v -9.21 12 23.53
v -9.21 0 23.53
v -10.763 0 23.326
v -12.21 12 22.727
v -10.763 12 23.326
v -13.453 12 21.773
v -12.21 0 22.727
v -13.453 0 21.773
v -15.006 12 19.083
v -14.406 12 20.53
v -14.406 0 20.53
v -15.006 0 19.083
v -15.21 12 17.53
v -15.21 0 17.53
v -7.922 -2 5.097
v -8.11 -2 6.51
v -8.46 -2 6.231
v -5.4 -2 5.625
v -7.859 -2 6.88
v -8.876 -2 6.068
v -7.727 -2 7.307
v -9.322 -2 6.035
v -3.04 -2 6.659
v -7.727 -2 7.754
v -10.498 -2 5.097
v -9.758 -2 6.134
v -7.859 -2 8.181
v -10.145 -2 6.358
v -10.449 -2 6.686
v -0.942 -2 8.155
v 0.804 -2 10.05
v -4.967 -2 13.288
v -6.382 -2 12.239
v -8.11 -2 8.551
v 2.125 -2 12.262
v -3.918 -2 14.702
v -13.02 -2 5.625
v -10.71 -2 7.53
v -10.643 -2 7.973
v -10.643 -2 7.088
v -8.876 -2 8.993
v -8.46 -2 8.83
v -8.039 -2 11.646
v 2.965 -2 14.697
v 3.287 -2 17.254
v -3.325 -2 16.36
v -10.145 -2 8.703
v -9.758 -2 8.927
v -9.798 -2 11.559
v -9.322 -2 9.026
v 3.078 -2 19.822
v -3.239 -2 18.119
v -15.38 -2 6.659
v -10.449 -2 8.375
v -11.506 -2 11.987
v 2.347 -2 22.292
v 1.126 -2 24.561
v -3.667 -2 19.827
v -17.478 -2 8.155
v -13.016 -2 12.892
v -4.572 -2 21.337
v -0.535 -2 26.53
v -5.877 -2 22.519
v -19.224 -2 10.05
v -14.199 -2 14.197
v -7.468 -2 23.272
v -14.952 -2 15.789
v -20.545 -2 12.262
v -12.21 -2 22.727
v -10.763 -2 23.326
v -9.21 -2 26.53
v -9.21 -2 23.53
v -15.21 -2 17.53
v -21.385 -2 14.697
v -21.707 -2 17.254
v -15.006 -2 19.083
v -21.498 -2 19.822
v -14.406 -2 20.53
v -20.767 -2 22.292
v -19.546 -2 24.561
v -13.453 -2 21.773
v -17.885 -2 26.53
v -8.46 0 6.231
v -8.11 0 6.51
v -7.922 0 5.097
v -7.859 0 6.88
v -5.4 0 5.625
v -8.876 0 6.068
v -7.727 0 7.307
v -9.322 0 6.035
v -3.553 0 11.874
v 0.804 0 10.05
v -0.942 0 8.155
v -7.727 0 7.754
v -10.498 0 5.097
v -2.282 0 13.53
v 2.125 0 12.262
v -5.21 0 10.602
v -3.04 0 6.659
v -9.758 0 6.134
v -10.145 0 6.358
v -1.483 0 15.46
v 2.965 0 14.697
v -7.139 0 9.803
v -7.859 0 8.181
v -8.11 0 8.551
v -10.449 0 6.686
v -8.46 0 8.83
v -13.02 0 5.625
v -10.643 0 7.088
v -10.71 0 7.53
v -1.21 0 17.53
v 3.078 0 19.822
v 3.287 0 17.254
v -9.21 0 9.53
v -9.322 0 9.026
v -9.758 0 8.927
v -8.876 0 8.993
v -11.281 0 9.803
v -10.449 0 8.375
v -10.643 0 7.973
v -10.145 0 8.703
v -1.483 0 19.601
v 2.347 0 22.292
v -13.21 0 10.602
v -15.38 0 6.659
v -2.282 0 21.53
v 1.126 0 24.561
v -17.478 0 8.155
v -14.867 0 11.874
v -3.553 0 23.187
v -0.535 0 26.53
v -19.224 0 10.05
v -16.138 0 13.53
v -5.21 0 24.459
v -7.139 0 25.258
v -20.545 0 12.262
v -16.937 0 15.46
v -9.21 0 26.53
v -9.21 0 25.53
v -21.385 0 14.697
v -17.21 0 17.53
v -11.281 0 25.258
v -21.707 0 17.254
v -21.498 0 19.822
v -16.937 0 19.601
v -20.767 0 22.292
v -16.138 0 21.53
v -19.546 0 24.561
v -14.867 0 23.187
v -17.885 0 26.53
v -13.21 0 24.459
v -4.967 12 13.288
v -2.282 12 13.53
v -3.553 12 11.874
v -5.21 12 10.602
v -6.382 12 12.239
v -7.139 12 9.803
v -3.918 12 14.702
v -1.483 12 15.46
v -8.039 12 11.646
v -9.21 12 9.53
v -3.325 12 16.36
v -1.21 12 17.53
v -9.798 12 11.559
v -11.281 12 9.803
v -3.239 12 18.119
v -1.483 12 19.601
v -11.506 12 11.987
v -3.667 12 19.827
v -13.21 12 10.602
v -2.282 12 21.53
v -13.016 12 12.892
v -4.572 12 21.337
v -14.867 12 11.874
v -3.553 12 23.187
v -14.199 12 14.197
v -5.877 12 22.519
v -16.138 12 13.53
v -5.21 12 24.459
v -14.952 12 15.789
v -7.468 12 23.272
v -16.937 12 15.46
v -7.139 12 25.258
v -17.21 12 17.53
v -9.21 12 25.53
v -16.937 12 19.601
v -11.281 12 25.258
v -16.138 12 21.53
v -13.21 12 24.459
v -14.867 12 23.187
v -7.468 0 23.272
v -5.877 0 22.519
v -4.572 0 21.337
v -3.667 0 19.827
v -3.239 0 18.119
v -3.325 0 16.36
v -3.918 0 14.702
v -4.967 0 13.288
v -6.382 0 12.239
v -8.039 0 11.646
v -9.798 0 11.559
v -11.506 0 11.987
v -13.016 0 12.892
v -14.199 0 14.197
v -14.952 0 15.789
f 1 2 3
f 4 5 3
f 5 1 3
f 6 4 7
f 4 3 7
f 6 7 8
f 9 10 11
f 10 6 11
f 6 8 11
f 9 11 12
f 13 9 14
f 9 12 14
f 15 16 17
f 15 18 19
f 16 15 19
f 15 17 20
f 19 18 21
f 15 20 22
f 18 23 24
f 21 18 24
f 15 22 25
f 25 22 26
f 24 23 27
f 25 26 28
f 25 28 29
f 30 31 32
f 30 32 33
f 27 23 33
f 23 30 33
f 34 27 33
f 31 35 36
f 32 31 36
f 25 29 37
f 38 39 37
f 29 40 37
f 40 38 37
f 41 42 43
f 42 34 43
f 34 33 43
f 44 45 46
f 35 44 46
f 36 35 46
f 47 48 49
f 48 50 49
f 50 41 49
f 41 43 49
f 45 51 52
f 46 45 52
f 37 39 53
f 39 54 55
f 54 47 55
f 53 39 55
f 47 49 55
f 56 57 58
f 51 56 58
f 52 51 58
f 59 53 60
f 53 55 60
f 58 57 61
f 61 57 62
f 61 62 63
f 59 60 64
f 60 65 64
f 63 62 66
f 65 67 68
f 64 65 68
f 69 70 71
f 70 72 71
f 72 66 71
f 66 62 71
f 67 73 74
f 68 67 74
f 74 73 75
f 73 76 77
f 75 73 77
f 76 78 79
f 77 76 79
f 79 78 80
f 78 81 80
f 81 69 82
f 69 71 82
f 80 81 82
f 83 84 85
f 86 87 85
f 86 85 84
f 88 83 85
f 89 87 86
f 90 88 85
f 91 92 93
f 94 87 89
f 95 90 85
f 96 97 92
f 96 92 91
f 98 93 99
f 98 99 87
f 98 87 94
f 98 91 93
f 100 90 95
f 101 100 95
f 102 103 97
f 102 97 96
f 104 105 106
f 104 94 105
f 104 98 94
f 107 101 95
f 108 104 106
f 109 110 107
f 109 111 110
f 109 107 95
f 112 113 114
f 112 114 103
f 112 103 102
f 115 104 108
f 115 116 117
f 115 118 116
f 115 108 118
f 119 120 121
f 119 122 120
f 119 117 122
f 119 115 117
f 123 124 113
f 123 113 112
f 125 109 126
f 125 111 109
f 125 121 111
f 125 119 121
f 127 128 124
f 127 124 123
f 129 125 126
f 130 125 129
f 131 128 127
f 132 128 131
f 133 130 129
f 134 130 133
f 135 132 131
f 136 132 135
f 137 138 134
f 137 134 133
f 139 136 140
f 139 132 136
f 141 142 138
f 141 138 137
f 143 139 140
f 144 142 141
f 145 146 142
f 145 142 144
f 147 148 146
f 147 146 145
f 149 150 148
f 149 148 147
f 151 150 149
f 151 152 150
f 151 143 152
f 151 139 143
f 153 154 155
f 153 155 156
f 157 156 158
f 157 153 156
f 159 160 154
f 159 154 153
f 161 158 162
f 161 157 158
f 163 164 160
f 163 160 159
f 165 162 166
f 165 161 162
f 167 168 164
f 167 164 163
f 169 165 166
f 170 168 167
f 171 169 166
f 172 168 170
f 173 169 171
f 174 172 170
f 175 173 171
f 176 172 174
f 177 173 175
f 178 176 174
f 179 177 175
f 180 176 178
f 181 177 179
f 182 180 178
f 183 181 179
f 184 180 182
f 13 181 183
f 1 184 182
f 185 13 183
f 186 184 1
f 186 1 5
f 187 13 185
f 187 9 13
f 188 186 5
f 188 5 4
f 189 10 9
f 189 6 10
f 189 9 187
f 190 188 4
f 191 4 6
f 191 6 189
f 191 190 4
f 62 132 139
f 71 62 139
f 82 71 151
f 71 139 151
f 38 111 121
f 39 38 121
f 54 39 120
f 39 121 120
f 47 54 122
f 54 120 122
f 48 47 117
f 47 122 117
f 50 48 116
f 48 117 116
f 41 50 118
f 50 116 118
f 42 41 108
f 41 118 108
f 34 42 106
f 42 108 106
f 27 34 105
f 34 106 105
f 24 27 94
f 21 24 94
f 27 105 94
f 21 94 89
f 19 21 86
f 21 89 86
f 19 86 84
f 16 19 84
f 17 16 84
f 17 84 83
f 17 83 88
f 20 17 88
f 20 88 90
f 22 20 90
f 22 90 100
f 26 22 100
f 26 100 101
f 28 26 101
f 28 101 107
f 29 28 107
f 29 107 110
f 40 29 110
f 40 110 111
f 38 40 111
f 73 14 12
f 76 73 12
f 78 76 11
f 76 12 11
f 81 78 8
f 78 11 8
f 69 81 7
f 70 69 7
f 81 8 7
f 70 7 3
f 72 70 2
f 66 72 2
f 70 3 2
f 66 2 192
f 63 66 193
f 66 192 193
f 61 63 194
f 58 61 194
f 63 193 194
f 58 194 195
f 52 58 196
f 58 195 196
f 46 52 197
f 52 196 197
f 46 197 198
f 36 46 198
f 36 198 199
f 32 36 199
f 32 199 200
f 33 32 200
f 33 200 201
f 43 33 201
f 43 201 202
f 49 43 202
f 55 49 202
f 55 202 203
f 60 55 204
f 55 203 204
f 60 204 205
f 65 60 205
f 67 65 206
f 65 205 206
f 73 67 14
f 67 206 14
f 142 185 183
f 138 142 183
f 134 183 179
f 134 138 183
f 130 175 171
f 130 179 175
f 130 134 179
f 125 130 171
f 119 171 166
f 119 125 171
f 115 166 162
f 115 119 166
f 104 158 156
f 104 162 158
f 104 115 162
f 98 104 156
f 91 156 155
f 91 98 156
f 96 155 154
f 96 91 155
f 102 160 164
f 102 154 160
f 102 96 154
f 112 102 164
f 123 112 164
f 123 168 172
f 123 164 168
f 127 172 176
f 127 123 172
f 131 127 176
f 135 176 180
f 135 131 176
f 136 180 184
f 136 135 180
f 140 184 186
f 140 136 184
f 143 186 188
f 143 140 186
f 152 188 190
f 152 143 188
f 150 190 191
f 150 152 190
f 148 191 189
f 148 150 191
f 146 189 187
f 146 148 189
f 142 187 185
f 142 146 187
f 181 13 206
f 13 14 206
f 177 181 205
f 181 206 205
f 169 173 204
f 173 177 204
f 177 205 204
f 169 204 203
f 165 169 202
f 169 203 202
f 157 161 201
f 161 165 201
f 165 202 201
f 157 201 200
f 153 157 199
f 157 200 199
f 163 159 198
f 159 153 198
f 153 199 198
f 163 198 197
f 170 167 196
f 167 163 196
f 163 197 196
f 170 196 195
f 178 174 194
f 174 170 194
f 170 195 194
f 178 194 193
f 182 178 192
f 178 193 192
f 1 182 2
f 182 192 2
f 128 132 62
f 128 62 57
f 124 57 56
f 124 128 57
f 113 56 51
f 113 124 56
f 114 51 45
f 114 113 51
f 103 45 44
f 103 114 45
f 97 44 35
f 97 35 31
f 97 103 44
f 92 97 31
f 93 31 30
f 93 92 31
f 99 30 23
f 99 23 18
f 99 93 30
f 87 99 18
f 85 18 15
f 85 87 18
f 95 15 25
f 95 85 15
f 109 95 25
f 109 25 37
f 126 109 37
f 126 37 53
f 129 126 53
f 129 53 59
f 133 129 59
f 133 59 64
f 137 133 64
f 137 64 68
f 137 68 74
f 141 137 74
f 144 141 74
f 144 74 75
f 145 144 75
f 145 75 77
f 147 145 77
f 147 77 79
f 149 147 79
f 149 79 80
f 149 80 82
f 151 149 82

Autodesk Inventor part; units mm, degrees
ref_plane "YZ Plane" through (0, 0, 0) normal (1, 0, 0) x (0, 1, 0)
ref_plane "XZ Plane" through (0, 0, 0) normal (0, 1, 0) x (-1, 0, 0)
ref_plane "Work Plane1" through (-12, 0, -11) normal (0, 0, 1) x (1, 0, 0)
sketch "Boceto6" plane through (0, 0, 0) normal (0, 1, 0) x (-1, 0, 0)
  circle A0 centre (9.21, 17.5305) radius 6
  circle A1 centre (9.21, 17.5305) radius 8
  arc A2 (0.5354, 26.5305) -> (17.8847, 26.5305) centre (9.21, 17.5305) ccw
  circle A3 centre (9.21, 7.5305) radius 1.5
  line L0 (9.21, 17.5305) -> (9.21, 26.5305)
  line L1 (9.21, 26.5305) -> (17.8847, 26.5305)
  line L2 (17.8847, 26.5305) -> (0.5354, 26.5305)
  point P0 (0, 0)
  dimension "d143" = 12
  dimension "d144" = 16
  dimension "d145" = 25
  dimension "d146" = 3
  dimension "d147" = 10
  dimension "d148" = 9
extrude "Extrusión11" add sketch "Boceto6" along normal blind 12 contours A1
extrude "Extrusión12" add sketch "Boceto6" against normal blind 2 contours A1 | L1 A2 L2
properties part number "Buje de Soporte de Motor" material "Acetal Resin, White"
